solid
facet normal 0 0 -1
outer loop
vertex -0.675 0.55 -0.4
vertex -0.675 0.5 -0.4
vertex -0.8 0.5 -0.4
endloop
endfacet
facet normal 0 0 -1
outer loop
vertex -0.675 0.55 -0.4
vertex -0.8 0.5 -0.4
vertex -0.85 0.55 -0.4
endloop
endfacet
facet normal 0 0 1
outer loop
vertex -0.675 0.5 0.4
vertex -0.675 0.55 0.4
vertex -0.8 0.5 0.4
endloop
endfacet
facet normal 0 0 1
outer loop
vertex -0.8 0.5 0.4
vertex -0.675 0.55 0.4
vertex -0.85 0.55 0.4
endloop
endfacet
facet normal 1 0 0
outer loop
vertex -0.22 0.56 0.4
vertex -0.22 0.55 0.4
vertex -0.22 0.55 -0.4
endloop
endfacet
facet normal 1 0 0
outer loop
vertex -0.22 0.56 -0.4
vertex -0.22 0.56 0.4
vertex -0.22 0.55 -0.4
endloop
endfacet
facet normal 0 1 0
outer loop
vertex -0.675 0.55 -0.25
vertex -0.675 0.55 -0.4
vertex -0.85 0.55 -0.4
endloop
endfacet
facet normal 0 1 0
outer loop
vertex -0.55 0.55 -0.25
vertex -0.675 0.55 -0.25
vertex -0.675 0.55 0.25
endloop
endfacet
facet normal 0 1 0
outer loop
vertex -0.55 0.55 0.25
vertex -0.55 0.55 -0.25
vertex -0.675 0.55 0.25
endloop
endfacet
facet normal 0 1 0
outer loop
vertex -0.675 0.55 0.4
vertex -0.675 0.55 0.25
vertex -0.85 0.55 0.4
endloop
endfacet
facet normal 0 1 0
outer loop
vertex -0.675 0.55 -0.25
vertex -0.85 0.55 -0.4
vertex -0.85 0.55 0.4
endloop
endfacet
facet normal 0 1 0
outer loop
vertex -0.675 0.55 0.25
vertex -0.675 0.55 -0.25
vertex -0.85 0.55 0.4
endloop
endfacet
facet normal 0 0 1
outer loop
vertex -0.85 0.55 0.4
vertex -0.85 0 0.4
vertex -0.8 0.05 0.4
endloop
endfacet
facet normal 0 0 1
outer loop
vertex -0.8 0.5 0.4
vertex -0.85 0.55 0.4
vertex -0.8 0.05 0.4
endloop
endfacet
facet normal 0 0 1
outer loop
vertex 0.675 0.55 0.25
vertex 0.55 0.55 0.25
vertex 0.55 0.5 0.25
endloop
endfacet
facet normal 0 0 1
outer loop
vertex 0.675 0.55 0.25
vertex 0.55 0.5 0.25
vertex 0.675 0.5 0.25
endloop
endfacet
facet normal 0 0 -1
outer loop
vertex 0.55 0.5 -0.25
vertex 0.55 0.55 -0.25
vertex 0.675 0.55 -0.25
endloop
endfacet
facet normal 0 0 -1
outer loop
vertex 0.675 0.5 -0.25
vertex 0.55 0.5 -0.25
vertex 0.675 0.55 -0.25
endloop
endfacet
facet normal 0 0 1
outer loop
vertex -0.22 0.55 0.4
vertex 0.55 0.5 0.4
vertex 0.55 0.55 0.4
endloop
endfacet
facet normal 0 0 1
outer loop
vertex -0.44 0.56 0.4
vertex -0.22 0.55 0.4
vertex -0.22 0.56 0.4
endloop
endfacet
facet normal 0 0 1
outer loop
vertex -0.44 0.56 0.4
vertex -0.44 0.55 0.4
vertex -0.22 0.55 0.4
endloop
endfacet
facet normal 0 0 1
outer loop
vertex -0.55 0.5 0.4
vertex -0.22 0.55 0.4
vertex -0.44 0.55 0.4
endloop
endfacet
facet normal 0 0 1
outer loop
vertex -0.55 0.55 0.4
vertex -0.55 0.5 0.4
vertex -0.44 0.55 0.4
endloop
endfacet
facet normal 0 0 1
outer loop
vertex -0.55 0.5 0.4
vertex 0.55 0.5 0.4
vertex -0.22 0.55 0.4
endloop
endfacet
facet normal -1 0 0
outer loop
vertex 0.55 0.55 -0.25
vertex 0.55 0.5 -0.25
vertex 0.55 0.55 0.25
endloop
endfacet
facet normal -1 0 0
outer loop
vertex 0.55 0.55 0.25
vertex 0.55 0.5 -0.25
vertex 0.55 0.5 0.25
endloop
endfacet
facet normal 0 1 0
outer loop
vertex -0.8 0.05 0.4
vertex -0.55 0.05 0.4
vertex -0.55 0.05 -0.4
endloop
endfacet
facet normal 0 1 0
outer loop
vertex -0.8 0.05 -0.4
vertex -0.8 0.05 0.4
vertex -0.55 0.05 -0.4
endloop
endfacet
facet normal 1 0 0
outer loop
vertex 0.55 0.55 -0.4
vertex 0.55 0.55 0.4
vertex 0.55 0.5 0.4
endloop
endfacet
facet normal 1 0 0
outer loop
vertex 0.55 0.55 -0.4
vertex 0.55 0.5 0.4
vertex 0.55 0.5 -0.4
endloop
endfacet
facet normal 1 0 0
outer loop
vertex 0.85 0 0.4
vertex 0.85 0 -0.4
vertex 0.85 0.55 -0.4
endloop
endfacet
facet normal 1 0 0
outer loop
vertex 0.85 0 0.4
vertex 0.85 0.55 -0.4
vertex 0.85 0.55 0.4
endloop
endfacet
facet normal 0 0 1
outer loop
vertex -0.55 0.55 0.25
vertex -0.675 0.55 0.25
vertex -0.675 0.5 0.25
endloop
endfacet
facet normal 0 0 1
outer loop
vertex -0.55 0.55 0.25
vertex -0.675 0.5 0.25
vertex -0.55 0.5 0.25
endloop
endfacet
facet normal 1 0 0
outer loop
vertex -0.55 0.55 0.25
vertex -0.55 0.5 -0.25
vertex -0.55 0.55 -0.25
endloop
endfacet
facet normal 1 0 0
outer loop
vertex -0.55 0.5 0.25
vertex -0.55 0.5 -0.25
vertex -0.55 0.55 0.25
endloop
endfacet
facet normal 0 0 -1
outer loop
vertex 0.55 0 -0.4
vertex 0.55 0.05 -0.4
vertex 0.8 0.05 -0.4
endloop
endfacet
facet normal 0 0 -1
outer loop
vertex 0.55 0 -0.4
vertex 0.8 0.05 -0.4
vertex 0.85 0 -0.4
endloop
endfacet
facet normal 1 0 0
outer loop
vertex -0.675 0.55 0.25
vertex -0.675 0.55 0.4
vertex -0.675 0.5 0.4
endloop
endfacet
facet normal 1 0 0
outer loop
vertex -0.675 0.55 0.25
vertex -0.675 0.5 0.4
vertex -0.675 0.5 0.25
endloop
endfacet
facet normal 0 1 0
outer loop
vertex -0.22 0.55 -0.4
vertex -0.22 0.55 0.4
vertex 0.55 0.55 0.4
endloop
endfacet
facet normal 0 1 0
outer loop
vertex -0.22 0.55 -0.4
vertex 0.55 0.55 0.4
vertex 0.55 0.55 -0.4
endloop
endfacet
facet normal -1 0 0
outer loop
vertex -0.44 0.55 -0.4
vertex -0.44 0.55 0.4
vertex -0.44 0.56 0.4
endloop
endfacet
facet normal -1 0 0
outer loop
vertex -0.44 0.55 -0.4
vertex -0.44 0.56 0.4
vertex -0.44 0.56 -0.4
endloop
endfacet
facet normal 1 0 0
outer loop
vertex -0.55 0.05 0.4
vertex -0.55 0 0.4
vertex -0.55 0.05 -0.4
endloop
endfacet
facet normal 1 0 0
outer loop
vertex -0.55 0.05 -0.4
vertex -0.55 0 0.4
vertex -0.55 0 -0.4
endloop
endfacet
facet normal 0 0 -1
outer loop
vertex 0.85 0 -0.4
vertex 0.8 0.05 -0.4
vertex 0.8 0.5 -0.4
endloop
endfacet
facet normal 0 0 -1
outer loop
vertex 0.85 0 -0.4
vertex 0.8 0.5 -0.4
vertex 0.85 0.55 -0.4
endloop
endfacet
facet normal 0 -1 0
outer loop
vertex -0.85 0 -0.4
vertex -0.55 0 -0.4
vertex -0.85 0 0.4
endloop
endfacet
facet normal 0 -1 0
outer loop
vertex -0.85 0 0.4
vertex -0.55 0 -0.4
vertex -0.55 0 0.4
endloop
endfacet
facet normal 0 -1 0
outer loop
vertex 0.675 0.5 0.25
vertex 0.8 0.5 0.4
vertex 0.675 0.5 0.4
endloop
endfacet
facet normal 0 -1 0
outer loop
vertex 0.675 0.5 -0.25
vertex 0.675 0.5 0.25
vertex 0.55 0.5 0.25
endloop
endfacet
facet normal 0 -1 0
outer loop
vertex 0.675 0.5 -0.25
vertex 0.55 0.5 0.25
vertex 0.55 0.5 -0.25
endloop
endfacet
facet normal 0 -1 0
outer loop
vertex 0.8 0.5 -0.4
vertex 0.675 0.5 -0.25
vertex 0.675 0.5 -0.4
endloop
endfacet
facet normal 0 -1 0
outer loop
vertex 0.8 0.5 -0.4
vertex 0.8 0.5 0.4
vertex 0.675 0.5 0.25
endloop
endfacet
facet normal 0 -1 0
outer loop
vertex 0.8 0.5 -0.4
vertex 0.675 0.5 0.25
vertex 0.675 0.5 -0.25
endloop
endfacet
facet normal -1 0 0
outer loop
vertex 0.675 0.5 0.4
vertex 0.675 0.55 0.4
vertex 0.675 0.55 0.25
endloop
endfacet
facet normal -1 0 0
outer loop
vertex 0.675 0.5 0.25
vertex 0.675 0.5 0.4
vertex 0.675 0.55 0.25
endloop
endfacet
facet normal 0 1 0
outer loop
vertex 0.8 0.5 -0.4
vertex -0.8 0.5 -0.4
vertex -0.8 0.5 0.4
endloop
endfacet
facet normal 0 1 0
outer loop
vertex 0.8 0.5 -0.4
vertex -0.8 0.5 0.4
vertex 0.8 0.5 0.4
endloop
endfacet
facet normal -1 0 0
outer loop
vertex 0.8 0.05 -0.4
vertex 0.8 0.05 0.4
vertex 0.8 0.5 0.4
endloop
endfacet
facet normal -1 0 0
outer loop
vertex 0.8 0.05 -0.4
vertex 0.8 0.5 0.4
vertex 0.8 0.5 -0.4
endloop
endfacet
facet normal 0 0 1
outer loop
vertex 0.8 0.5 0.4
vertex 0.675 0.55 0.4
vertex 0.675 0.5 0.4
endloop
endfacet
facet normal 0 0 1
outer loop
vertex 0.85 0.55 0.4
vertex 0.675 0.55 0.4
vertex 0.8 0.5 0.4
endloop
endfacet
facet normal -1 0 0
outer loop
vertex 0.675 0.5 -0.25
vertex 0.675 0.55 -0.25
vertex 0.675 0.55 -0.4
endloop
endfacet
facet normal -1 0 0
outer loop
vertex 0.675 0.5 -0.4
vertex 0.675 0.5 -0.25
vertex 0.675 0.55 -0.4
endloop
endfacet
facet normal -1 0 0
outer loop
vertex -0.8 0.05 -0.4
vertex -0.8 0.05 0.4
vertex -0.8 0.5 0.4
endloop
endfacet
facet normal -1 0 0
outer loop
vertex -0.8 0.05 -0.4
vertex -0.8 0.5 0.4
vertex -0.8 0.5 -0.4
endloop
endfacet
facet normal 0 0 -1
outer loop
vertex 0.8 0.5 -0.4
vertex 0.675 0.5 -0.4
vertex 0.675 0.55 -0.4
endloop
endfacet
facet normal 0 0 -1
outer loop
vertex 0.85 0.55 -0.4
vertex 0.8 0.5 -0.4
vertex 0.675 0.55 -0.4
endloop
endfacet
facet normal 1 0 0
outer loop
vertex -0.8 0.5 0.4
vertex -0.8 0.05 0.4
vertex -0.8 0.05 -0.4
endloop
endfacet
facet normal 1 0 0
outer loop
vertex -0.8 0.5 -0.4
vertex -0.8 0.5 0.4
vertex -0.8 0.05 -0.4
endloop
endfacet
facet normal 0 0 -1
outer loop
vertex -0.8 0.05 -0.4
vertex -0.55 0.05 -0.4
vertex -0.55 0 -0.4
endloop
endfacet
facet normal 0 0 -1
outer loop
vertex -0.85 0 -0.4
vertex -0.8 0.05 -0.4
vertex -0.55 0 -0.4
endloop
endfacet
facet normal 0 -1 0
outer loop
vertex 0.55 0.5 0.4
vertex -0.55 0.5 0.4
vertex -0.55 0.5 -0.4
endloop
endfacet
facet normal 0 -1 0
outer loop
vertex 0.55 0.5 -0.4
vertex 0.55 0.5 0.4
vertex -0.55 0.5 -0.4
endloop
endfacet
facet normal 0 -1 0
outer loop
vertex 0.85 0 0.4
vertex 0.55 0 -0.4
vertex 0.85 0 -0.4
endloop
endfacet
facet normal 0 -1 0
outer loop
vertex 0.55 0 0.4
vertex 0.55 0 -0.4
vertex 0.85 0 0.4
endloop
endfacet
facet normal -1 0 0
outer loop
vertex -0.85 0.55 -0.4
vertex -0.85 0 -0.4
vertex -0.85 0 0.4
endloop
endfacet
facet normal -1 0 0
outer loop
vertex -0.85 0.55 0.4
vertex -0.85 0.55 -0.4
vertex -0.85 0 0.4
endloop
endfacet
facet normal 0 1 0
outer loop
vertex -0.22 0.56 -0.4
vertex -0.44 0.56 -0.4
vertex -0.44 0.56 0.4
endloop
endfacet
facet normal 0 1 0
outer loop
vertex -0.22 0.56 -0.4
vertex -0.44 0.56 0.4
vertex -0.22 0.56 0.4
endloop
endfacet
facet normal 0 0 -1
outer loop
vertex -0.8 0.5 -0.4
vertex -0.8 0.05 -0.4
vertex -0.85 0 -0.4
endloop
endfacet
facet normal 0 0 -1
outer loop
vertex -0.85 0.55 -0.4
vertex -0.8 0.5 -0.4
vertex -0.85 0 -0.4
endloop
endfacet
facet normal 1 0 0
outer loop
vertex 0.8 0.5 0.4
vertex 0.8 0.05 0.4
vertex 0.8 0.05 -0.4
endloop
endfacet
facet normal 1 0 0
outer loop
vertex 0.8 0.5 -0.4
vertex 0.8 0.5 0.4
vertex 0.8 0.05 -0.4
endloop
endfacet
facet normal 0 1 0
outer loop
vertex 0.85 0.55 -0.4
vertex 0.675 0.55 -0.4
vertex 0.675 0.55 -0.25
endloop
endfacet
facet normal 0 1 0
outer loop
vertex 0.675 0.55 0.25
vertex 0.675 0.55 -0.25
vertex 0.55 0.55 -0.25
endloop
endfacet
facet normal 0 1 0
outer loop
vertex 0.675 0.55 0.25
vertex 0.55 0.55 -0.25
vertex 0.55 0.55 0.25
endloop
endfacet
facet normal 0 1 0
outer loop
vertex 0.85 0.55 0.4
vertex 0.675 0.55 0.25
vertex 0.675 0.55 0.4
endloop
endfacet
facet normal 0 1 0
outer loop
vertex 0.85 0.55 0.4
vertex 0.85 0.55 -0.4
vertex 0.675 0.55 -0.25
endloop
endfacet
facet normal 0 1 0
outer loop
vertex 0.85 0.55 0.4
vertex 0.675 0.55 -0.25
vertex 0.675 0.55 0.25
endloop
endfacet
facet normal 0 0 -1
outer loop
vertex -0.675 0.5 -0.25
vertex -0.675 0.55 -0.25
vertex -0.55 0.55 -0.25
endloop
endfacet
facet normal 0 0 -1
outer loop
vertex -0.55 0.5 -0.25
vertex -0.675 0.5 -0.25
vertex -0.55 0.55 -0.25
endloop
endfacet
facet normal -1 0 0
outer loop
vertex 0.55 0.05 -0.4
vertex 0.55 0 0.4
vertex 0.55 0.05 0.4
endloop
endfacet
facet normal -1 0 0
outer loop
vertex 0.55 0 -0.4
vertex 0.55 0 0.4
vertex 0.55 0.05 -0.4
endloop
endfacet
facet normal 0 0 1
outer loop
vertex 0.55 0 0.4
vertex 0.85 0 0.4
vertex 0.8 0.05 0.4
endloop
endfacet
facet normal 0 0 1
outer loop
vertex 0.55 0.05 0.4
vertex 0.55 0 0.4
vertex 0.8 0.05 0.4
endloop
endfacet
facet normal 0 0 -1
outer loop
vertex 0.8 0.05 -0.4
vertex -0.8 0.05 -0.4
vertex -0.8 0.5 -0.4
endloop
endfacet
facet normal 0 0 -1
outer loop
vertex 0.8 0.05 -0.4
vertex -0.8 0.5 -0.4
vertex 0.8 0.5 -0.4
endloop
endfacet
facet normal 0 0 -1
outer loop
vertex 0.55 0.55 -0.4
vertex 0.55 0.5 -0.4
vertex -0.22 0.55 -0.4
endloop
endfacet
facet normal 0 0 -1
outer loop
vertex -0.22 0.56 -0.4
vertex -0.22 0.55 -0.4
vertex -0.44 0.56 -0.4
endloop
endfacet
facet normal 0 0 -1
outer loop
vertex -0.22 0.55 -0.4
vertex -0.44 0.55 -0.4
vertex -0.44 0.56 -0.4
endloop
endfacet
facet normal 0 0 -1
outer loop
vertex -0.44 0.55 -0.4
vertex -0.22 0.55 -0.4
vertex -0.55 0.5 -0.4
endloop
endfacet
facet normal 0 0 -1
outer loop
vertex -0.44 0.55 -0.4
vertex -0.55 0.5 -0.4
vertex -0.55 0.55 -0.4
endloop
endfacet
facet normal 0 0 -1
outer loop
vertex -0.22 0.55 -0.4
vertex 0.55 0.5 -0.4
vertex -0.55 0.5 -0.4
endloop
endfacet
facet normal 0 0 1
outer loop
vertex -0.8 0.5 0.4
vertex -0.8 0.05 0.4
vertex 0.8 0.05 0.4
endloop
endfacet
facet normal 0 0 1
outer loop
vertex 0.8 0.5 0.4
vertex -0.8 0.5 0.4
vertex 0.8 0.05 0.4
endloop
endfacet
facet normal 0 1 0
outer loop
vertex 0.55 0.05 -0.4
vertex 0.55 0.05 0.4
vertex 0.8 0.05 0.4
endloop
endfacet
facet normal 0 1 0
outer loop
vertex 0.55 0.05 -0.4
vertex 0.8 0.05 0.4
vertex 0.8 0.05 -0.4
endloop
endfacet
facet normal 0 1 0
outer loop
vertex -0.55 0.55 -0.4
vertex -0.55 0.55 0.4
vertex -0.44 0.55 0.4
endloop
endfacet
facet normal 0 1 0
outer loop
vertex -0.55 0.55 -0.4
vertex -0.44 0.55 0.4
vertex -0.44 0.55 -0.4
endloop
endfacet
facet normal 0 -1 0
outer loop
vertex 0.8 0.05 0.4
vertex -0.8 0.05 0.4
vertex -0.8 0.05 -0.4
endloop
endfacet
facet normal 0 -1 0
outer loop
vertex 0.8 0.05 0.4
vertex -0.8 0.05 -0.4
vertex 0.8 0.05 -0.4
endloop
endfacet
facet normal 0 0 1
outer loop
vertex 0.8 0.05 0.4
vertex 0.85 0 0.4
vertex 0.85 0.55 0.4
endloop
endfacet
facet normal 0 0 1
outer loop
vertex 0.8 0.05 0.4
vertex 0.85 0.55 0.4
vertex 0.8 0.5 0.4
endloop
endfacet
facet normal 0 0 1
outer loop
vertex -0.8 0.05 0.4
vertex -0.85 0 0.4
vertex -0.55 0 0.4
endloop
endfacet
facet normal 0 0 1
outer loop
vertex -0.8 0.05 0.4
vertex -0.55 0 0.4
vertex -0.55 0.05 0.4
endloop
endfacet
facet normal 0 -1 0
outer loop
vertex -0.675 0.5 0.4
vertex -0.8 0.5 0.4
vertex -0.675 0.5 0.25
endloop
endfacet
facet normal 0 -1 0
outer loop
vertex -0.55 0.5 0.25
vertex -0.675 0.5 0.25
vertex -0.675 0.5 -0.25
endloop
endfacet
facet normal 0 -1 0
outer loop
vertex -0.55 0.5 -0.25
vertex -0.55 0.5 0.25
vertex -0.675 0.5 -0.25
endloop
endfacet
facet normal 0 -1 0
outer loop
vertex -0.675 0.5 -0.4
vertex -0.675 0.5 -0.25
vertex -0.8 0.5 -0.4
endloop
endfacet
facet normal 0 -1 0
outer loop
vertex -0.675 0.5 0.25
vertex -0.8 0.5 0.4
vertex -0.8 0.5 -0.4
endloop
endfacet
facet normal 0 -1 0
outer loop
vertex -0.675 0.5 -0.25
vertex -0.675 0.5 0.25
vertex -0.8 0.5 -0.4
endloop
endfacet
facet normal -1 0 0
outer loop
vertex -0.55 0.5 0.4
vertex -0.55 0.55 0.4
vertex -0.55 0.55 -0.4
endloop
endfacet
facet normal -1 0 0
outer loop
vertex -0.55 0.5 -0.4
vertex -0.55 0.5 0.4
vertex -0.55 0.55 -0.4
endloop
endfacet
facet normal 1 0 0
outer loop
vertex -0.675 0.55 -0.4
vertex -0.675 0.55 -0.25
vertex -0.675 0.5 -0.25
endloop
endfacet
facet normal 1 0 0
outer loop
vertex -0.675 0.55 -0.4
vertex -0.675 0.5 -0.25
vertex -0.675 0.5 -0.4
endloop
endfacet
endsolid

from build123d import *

# Parameters (mm, degrees)
CROQUIS1_W          = 1.6
CROQUIS1_H          = 0.8
EXTRUIR1_DEPTH      = 0.5
CROQUIS2_W          = 1.6
CROQUIS2_H          = 0.05
EXTRUIR2_DEPTH      = 2.236931688
CROQUIS4_W          = 0.8
CROQUIS4_H          = 0.05
EXTRUIR3_DEPTH      = 1.1
CROQUIS5_W          = 0.125
CROQUIS5_H          = 0.15
EXTRUIR4_DEPTH      = 0.05
SKETCH1_W           = 0.22
SKETCH1_H           = 0.8
BOSS_EXTRUDE1_DEPTH = 0.01


with BuildPart() as part:
    # Croquis1 → Extruir1 (new body)
    with BuildSketch(Plane(origin=(0, 0, 0), x_dir=(1, 0, 0), z_dir=(0, 1, 0))):
        Rectangle(CROQUIS1_W, CROQUIS1_H)
    extrude(amount=EXTRUIR1_DEPTH)

    # Croquis2 → Extruir2 (cut, through all)
    with BuildSketch(Plane.XY.offset(0.4)):
        with Locations((0, 0.025)):
            Rectangle(CROQUIS2_W, CROQUIS2_H)
    extrude(amount=-EXTRUIR2_DEPTH, mode=Mode.SUBTRACT)


with BuildPart() as body_2:
    # Barrer1: sweep along a path in Croquis3
    with BuildLine(Plane.XY.offset(0.4)) as barrer1_path:
        Line((-0.55, 0.55), (-0.85, 0.55))
        Line((-0.85, 0.55), (-0.85, 0))
        Line((-0.85, 0), (-0.55, 0))
    # Croquis3D1 → Barrer1 (sweep)
    with BuildSketch(Plane(origin=(-0.55, 0.55, 0.4), x_dir=(0, -0.06237828615518069, -0.9980525784828886), z_dir=(1, 0, 0))):
        Polygon((0, 0), (0.798442063, 0.049902629), (0.801560977, 0), (0.003118914, -0.049902629), align=None)
    sweep(path=barrer1_path.line, transition=Transition.RIGHT)


with BuildPart() as body_3:
    # Simetría1: mirrored copy
    add(body_2.part.mirror(Plane(origin=(0, 0.5, 0.4), x_dir=(0, 0, 1), z_dir=(1, 0, 0))))


with BuildPart() as body_4:
    # Croquis4 → Extruir3 (new body)
    with BuildSketch(Plane(origin=(-0.55, 0, 0), x_dir=(0, 0, -1), z_dir=(1, 0, 0))):
        with Locations((0, 0.525)):
            Rectangle(CROQUIS4_W, CROQUIS4_H)
    extrude(amount=EXTRUIR3_DEPTH)

    # Sketch1 → Boss-Extrude1 (add)
    with BuildSketch(Plane(origin=(0, 0.55, 0), x_dir=(1, 0, 0), z_dir=(0, 1, 0))):
        with Locations((-0.33, 0)):
            Rectangle(SKETCH1_W, SKETCH1_H)
    extrude(amount=BOSS_EXTRUDE1_DEPTH)


with BuildPart() as extruir4_tool:
    # Croquis5 → Extruir4 (new body)
    with BuildSketch(Plane(origin=(0, 0.55, 0), x_dir=(1, 0, 0), z_dir=(0, 1, 0))):
        with Locations((-0.6125, -0.325)):
            Rectangle(CROQUIS5_W, CROQUIS5_H)
        with Locations((-0.6125, 0.325)):
            Rectangle(CROQUIS5_W, CROQUIS5_H)
        with Locations((0.6125, 0.325)):
            Rectangle(CROQUIS5_W, CROQUIS5_H)
        with Locations((0.6125, -0.325)):
            Rectangle(CROQUIS5_W, CROQUIS5_H)
    extrude(amount=-EXTRUIR4_DEPTH)


with BuildPart() as body_2_1:
    add(body_2.part)

    # Extruir4: cut by extruir4_tool
    add(extruir4_tool.part, mode=Mode.SUBTRACT)


with BuildPart() as body_3_1:
    add(body_3.part)

    # Extruir4: cut by extruir4_tool
    add(extruir4_tool.part, mode=Mode.SUBTRACT)


solid = Compound([part.part, body_4.part, body_2_1.part, body_3_1.part])
